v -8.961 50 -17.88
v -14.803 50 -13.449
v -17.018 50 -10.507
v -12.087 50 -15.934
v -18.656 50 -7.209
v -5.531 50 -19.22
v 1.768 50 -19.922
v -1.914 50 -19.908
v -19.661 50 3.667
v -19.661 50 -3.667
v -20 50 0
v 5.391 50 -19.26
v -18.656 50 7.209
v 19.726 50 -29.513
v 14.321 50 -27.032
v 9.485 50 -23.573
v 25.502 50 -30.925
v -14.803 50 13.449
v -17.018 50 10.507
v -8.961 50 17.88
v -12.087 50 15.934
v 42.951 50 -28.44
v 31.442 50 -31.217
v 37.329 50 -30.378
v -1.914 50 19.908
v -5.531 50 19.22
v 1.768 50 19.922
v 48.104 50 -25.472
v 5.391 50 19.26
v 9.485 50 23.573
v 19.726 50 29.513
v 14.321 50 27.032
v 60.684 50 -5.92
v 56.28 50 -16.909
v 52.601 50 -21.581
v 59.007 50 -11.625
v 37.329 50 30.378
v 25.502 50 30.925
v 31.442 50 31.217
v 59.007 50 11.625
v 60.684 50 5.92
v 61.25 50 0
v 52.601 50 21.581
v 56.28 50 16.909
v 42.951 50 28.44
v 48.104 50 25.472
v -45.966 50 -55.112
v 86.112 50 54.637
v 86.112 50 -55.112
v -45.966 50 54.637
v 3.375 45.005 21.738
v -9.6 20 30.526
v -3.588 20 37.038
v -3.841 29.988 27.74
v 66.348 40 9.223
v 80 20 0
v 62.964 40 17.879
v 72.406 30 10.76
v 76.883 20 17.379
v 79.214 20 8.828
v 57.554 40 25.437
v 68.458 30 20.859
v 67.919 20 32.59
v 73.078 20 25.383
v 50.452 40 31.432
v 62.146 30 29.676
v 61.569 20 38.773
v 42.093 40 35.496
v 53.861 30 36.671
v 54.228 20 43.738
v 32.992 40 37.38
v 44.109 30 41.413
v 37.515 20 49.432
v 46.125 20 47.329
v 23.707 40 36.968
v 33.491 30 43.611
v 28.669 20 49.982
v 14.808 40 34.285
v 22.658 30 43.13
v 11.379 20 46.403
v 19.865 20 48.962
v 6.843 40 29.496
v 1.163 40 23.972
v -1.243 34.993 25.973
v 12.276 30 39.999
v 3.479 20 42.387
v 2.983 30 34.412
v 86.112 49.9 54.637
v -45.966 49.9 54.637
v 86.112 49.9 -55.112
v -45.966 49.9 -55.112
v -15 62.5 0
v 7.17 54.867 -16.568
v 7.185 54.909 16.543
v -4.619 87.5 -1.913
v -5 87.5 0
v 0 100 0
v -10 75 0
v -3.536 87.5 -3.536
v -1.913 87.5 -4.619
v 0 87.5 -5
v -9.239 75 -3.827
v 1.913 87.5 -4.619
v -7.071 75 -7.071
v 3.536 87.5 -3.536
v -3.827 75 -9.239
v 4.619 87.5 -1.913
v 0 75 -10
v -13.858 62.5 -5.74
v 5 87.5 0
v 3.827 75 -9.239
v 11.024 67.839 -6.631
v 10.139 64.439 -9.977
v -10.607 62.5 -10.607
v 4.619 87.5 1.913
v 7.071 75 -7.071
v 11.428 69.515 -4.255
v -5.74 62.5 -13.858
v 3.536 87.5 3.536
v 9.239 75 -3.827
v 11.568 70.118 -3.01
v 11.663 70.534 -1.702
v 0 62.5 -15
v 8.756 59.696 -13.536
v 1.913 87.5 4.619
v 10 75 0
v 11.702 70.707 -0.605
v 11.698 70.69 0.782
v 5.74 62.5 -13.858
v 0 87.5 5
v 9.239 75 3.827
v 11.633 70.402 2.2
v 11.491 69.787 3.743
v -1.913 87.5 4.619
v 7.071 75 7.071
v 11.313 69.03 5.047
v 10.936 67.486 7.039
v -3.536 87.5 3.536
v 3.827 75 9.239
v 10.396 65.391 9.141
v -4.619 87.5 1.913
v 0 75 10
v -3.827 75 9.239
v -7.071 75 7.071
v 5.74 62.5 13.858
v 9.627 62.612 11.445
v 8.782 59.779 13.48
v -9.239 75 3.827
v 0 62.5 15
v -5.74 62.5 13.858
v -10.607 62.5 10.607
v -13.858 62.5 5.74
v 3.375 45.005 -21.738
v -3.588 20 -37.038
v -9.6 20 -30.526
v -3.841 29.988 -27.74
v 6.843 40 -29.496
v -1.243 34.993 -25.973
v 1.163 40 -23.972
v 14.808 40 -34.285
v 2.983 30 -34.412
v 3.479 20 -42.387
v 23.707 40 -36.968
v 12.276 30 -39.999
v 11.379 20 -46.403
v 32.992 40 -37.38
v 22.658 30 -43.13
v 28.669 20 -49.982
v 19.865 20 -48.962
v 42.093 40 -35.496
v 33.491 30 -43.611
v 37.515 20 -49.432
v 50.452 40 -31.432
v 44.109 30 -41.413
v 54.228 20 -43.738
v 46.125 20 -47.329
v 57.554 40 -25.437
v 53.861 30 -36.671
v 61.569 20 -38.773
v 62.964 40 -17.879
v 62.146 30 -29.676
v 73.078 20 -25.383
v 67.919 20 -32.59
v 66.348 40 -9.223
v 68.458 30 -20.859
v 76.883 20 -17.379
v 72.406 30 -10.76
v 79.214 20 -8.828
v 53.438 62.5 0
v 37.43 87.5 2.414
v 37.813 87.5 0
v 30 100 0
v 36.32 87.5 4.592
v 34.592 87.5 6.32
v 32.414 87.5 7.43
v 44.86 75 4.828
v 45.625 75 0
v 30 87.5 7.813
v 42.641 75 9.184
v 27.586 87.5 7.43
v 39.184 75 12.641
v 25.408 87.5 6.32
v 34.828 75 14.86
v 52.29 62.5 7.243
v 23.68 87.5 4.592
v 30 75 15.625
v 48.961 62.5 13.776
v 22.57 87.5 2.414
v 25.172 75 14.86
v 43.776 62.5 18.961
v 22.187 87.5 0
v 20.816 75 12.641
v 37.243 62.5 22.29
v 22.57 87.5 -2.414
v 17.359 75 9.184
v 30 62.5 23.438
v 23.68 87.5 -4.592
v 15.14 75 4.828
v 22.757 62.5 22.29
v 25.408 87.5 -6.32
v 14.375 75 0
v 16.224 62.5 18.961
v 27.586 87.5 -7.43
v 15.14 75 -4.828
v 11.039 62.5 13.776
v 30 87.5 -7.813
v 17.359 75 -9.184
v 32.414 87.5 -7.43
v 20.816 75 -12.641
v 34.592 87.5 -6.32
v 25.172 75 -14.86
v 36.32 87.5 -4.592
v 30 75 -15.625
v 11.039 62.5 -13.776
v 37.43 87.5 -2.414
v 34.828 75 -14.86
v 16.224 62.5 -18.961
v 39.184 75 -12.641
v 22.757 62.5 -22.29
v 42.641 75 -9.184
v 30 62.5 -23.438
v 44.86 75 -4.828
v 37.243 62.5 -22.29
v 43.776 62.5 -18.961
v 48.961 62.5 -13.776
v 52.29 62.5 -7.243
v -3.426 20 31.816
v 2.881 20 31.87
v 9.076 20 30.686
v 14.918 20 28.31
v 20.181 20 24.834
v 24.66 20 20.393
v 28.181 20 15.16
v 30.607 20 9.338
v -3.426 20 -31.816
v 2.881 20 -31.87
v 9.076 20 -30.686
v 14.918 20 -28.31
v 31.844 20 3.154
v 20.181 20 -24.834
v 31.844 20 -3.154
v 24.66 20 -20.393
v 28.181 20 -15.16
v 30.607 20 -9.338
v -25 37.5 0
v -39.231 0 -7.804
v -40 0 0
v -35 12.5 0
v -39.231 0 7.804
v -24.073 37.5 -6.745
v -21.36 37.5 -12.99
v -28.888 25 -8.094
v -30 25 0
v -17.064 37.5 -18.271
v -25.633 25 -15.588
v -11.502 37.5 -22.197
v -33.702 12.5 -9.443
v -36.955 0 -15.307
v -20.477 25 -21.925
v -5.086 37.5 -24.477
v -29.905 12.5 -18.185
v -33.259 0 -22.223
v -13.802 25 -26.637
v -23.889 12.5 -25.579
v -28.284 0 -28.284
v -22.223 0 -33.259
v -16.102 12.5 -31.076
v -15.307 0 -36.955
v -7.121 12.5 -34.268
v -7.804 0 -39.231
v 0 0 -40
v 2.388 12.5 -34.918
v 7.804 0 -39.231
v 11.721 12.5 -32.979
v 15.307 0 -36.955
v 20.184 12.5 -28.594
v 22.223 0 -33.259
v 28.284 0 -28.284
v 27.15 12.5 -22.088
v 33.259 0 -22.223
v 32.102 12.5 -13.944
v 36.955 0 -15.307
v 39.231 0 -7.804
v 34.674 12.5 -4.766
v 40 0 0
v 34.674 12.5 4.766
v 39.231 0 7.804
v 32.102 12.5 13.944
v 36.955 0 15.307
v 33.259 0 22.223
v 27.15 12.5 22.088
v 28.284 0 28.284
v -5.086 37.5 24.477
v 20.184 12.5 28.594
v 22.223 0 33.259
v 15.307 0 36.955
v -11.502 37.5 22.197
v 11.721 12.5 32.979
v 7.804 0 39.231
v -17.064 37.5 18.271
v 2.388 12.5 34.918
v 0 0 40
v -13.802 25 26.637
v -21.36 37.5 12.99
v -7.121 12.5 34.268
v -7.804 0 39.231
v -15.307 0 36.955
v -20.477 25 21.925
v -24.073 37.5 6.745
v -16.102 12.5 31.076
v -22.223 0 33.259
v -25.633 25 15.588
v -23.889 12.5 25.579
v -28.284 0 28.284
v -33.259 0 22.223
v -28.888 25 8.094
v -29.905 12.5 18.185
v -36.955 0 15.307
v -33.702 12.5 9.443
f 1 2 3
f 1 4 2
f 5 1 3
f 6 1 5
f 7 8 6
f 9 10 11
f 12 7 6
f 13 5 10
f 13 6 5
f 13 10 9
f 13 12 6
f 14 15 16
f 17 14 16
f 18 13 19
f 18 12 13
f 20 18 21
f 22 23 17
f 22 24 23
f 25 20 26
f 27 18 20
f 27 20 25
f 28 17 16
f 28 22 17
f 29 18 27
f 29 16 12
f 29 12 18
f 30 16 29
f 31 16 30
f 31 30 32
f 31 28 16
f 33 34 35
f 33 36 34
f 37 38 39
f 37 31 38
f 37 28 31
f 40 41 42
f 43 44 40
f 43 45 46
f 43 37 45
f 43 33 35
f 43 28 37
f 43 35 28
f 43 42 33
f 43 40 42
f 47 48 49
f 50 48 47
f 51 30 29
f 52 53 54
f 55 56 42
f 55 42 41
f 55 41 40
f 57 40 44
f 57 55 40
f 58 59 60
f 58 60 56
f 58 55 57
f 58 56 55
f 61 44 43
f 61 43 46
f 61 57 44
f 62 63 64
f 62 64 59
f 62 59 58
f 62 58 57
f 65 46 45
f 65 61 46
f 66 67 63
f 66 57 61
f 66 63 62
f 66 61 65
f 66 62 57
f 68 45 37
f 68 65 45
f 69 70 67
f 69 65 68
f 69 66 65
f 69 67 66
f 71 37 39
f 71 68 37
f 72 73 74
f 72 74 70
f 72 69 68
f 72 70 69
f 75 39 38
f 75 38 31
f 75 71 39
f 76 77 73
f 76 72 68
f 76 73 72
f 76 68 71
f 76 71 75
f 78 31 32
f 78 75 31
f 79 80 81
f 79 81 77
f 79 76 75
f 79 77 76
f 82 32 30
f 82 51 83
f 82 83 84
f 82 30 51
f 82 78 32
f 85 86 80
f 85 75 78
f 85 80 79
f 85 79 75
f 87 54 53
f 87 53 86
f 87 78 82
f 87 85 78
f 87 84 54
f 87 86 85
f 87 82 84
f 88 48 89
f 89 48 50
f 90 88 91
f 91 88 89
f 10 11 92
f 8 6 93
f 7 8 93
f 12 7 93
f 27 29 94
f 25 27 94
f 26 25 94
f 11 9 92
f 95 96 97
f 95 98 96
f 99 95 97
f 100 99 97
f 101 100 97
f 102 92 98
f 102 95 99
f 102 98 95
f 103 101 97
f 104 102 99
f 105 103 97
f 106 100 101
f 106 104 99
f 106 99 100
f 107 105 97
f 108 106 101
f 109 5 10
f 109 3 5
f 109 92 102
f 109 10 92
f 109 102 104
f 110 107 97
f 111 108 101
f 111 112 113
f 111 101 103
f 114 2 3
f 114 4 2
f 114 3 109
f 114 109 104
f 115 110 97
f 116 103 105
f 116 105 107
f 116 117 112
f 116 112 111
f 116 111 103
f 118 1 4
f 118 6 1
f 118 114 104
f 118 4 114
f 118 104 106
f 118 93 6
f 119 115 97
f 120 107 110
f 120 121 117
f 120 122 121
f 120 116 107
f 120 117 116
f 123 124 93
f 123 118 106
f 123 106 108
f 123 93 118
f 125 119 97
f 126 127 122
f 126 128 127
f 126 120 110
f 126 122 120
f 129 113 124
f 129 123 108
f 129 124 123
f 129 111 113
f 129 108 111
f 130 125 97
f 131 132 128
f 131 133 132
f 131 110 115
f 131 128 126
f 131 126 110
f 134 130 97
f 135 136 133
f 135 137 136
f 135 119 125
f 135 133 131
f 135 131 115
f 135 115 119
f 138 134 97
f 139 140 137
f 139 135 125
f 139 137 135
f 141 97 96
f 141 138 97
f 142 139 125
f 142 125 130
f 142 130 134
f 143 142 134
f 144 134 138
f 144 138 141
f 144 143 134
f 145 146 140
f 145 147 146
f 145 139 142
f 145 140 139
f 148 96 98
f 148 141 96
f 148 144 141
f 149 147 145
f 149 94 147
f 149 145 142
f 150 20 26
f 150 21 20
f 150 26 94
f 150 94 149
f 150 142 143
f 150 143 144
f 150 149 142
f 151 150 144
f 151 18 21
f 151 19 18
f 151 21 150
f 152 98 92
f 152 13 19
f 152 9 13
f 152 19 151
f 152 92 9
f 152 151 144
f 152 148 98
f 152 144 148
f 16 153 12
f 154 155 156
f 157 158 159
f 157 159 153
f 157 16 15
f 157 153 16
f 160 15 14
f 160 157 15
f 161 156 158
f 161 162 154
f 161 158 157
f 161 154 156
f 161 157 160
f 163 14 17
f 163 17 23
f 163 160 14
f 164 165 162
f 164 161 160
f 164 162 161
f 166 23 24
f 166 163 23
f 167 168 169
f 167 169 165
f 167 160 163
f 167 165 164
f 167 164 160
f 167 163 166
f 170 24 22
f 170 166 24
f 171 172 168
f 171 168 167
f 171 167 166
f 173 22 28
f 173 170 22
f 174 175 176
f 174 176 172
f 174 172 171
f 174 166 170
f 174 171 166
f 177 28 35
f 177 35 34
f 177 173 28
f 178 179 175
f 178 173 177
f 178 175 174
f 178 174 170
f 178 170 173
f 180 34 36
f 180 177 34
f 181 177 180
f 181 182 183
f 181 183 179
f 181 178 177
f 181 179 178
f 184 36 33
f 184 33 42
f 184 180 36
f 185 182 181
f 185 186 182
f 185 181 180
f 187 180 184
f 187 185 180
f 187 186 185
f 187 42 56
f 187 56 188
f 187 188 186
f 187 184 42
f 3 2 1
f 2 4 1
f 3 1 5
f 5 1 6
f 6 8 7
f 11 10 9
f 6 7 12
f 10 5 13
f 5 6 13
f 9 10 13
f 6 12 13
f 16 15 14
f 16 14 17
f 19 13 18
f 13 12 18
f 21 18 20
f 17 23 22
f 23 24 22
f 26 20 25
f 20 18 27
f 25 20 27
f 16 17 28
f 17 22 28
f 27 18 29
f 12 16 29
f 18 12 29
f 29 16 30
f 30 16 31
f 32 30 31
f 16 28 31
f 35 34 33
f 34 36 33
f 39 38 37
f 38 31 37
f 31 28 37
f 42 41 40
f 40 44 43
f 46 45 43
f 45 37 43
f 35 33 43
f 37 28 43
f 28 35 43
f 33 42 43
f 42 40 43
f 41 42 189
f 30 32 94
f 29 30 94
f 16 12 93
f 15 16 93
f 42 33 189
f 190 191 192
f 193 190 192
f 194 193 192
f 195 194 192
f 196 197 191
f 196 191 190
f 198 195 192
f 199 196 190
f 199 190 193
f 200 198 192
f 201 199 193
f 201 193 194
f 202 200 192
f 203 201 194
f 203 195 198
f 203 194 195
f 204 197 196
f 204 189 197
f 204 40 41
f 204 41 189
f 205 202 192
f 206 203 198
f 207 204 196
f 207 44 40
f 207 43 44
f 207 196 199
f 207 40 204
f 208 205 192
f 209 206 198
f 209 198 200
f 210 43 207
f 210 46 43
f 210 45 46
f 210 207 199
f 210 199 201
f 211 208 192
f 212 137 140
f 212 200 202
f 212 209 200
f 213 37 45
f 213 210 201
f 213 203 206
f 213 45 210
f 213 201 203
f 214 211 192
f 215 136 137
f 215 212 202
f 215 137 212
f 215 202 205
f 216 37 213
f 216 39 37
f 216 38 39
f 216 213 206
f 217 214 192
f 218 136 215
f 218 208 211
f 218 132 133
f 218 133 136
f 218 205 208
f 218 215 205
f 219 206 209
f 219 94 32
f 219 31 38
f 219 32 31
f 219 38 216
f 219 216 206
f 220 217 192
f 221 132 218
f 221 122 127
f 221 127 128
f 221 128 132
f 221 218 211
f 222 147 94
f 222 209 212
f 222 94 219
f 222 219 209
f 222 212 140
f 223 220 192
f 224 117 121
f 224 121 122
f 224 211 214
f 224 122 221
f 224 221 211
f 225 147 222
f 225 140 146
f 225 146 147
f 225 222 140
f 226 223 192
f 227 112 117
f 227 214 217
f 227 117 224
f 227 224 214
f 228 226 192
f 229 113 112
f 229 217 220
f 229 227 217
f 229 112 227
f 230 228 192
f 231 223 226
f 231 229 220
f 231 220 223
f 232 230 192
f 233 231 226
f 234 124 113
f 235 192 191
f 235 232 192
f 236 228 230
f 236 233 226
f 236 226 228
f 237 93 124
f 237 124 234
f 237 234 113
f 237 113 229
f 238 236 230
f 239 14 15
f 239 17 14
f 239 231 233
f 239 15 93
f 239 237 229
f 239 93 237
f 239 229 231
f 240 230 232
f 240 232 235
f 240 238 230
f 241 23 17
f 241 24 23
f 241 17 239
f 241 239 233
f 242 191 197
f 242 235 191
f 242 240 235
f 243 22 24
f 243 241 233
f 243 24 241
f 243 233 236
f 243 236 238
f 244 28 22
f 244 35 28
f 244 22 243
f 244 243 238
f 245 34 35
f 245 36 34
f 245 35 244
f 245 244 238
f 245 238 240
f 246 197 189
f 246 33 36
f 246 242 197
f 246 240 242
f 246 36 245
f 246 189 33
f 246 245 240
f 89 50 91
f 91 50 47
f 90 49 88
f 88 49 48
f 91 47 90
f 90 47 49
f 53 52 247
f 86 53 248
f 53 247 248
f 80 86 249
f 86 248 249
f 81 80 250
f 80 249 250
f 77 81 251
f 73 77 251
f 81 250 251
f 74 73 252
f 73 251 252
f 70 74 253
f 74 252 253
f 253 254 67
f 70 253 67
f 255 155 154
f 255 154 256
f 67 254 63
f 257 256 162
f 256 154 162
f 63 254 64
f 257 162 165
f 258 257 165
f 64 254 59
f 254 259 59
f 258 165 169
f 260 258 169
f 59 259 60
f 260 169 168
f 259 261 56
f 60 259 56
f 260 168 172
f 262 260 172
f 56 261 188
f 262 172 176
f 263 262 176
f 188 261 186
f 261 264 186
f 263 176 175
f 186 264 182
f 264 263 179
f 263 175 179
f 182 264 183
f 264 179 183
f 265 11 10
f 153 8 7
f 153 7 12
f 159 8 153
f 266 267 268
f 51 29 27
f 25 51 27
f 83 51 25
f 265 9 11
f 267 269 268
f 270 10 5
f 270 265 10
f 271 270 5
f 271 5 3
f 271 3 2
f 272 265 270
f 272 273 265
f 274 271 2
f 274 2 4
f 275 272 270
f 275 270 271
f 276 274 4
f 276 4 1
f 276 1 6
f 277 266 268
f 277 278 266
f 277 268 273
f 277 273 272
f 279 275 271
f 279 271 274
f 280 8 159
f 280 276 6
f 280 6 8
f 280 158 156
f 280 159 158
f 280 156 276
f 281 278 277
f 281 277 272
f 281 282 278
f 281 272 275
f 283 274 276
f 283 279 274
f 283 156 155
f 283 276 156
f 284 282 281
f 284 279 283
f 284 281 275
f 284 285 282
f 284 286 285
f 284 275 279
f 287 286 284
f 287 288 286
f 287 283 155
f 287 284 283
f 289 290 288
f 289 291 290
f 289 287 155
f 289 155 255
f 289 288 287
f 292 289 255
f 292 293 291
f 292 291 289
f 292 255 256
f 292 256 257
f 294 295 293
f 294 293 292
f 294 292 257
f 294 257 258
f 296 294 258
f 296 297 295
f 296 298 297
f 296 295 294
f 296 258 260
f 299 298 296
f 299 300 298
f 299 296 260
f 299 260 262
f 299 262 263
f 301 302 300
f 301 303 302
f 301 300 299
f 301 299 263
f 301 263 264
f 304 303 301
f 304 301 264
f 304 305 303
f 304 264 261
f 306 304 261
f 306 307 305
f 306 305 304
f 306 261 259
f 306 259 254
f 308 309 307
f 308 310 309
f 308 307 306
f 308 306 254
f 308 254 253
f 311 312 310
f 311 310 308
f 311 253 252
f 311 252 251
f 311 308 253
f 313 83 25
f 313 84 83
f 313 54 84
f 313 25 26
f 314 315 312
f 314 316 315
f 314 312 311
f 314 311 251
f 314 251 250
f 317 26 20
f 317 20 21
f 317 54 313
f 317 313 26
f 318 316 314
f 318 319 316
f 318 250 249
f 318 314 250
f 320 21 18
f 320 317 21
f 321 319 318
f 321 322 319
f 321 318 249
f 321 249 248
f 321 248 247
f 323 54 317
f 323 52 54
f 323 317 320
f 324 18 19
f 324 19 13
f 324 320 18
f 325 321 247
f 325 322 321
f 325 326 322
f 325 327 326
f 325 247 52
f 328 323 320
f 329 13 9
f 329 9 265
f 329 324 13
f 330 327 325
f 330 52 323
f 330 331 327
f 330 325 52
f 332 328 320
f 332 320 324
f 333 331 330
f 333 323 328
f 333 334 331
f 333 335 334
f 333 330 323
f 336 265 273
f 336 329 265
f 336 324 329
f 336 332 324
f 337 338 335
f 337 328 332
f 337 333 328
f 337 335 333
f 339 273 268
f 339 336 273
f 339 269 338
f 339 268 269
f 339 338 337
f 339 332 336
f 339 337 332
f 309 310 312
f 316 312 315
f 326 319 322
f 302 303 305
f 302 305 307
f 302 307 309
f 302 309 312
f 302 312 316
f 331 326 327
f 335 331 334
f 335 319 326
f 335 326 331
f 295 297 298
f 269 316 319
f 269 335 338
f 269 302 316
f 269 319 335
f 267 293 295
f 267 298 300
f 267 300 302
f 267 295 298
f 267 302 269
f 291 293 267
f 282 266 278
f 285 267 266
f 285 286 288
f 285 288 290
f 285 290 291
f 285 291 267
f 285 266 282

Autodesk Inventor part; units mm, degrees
ref_plane "YZ Plane" through (0, 0, 0) normal (1, 0, 0) x (0, 1, 0)
ref_plane "XY Plane" through (0, 0, 0) normal (0, 0, 1) x (1, 0, 0)
sketch "Эскиз2" plane through (0, 0, 0) normal (0, 0, 1) x (1, 0, 0)
  line L0 (0, 0) -> (40, 0)
  line L1 (0, 0) -> (-40, 0)
  line L2 (0, 100) -> (-40, 0)
  line L3 (0, 100) -> (40, 0)
  line L4 (0, 100) -> (0, 0)
  dimension "d0" = 40
  dimension "d1" = 40
  dimension "d2" = 100
revolve "Вращение1" add sketch "Эскиз2" angle 360 about axis through (0, 100, 0) along (0, -1, 0) contours L1 L2 L4
sketch "Эскиз3" plane through (0, 0, 0) normal (0, 0, 1) x (1, 0, 0)
  line L0 (-40, 0) -> (40, 0) projected
  line L1 (0, 0) -> (30, 0)
  line L2 (30, 0) -> (30, 20)
  line L3 (30, 20) -> (80, 20)
  line L4 (30, 20) -> (-20, 20)
  line L5 (30, 20) -> (30, 100)
  line L6 (30, 100) -> (80, 20)
  line L7 (30, 100) -> (-20, 20)
  point P0 (0, 100)
  dimension "d4" = 30
  dimension "d5" = 20
  dimension "d6" = 50
  dimension "d7" = 50
  dimension "d8" = 80
revolve "Вращение2" add sketch "Эскиз3" angle 360 about axis through (30, 20, 0) along (0, 1, 0) contours L5 L6 L3
ref_plane "РабПлоскость1" through (0, 50, 0) normal (0, 1, 0) x (-1, 0, 0)
sketch "Эскиз5" plane through (0, 50, 0) normal (0, 1, 0) x (-1, 0, 0)
  line L0 (-86.1125, -55.112) -> (-86.1125, 54.6369)
  line L1 (-86.1125, 54.6369) -> (45.9663, 54.6369)
  line L2 (45.9663, 54.6369) -> (45.9663, -55.112)
  line L3 (45.9663, -55.112) -> (-86.1125, -55.112)
  circle A0 centre (0, 0) radius 40 projected
  arc A1 (9.6, 30.5261) -> (9.6, -30.5261) centre (-30, 0) ccw projected
  arc A2 (9.6, 30.5261) -> (9.6, -30.5261) centre (0, 0) ccw projected
  circle A3 centre (0, 0) radius 40 projected
extrude "Выдавливание2" add sketch "Эскиз5" against normal blind 0.1 separate body contours L0 L1 L2 L3 | A0 A1 A2 | A1 A2 A0 | A0 A1
split body "Разделение1" result two bodies by plane through (0, 50, 0) normal (0, 1, 0) bodies 1 first body at (16.8095, 67.609, -14.5712)
properties part number "Пересечение поверхностей"
